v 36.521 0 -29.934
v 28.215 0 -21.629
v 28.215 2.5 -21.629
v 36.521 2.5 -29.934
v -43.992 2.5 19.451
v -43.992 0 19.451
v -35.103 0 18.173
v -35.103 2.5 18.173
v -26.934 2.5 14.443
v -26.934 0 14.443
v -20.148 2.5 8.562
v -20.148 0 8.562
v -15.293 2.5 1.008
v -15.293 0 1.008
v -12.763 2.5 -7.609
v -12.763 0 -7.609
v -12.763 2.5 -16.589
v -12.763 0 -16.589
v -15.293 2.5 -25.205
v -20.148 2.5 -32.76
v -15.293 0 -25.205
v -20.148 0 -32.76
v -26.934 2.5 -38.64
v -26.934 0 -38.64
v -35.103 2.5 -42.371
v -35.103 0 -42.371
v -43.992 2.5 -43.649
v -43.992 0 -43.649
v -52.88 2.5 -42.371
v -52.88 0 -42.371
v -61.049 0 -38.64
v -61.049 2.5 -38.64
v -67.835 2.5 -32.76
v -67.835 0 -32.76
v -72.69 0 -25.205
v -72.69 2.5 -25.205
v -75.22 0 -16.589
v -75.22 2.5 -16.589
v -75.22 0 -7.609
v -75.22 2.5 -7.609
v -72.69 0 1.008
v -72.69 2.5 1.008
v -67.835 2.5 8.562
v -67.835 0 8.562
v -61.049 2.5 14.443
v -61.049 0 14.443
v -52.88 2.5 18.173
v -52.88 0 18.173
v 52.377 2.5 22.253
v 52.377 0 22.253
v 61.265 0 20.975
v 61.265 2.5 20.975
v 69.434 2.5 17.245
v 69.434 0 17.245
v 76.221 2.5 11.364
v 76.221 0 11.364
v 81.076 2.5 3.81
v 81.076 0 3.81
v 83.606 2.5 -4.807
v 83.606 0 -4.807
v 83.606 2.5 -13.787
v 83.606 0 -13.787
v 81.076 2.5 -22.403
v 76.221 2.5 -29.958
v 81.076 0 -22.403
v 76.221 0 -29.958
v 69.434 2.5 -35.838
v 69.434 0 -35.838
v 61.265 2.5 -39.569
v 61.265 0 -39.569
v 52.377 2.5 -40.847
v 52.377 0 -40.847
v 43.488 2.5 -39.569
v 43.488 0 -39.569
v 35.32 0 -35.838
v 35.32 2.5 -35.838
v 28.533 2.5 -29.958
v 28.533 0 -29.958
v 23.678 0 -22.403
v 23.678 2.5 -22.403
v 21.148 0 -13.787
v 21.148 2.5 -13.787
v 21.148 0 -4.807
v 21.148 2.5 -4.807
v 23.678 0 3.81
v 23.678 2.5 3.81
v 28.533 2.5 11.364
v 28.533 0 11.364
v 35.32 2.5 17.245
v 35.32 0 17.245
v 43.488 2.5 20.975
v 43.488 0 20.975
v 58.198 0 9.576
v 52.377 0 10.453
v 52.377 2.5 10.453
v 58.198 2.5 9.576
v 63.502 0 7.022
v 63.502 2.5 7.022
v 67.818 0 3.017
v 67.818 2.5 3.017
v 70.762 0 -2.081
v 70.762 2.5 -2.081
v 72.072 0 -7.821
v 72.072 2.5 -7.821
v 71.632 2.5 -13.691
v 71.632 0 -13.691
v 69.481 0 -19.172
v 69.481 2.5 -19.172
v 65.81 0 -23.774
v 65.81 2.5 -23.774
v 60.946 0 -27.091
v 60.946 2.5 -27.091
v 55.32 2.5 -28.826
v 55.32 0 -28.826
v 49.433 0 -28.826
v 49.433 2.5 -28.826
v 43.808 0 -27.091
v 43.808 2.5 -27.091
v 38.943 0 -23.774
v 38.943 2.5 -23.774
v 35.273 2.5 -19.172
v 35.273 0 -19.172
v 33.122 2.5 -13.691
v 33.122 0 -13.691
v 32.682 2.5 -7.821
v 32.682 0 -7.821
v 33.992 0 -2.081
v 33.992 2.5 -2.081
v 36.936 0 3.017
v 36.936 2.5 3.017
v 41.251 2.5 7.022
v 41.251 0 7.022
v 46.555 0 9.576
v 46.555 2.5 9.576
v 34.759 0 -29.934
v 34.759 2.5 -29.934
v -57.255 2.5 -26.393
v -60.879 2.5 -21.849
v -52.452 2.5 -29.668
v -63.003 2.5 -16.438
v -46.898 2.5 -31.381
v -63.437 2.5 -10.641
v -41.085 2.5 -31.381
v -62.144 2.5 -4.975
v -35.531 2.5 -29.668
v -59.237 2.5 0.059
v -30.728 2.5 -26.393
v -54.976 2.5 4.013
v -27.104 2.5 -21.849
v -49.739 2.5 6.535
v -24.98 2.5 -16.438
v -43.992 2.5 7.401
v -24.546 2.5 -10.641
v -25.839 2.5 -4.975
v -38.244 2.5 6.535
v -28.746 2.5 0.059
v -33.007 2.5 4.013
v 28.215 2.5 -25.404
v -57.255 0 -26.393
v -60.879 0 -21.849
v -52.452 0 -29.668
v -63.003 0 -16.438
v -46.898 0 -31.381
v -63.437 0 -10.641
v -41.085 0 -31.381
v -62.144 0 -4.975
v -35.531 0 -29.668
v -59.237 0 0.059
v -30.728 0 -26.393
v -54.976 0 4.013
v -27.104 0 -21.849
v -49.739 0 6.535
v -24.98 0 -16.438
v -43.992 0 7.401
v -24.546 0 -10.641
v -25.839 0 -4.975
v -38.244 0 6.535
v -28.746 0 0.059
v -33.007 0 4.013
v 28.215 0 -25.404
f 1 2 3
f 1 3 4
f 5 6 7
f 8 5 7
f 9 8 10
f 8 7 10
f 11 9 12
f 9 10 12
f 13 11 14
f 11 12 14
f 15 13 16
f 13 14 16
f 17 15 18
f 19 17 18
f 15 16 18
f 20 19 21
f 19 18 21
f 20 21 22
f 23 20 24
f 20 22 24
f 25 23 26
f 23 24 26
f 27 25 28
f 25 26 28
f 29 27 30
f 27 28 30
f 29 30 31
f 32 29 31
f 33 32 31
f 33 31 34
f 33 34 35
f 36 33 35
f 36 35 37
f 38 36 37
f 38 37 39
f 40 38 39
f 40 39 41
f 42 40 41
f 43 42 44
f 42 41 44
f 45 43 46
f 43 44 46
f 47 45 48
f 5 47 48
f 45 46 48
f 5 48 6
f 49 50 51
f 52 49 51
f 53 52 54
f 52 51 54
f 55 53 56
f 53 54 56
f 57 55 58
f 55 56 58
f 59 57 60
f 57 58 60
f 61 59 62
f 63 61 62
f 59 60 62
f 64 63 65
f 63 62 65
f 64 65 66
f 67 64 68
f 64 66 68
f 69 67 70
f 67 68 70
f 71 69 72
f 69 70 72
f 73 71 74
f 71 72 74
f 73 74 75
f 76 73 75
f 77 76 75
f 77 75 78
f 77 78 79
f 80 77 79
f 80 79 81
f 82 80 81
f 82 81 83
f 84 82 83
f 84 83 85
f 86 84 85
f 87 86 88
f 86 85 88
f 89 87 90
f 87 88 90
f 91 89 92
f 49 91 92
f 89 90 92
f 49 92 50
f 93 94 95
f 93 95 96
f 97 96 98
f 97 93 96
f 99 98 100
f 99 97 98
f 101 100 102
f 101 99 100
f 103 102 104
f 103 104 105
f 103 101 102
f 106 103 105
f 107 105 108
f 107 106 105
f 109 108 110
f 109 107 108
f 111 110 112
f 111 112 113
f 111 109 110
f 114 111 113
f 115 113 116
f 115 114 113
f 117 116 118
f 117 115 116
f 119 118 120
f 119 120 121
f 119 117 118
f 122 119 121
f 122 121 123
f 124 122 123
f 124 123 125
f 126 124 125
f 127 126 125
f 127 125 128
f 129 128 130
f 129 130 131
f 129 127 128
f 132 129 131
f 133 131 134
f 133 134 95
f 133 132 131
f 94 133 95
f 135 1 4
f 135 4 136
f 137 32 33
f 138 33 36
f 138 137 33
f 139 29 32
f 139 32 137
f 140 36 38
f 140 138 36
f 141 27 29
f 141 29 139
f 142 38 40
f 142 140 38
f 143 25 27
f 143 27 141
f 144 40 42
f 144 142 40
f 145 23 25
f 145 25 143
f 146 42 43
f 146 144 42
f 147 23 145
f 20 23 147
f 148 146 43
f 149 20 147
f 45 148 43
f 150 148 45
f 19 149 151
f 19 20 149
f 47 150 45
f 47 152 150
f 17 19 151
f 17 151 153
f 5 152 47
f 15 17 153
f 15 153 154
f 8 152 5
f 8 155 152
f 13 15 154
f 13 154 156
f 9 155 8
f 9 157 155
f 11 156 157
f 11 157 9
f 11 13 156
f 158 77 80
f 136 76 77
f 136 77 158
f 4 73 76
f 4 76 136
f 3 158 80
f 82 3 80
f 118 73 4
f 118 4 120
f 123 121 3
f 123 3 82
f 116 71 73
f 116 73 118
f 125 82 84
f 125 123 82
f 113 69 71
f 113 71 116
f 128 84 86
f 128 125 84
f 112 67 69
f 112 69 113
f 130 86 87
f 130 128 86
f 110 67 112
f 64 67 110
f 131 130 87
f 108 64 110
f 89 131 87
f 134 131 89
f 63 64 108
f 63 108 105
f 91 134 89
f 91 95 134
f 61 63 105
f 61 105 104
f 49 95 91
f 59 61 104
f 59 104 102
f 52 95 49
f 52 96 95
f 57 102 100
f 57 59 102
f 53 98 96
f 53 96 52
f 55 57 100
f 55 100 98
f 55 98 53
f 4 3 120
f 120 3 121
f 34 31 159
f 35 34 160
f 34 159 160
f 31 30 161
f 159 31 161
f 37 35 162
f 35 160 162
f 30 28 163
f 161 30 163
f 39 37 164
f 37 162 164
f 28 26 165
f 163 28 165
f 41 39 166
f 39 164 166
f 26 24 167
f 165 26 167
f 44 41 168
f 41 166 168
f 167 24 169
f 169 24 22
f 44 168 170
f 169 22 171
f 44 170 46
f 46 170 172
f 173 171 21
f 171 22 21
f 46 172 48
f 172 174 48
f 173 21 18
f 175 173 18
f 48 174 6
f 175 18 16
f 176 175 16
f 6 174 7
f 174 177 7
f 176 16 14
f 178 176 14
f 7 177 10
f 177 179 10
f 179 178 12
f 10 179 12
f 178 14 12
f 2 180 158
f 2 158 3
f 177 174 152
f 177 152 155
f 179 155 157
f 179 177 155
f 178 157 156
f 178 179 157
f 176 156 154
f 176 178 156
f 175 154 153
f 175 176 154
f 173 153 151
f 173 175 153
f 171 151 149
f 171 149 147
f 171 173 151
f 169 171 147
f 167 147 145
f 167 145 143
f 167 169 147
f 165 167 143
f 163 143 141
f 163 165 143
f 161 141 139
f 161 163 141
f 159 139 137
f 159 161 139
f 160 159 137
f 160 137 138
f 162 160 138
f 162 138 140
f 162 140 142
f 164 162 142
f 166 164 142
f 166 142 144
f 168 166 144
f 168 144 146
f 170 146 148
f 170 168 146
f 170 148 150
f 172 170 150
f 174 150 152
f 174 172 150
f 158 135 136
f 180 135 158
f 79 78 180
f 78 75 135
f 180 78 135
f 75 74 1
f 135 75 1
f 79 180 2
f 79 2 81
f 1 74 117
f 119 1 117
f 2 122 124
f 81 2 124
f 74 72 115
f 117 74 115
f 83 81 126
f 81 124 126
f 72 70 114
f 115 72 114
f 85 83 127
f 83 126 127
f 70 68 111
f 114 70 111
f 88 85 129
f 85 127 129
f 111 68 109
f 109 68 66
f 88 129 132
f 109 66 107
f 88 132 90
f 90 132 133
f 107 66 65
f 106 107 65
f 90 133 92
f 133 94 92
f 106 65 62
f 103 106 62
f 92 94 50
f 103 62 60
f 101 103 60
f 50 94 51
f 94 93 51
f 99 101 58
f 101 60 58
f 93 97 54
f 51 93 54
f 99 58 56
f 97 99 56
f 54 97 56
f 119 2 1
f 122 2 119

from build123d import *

# Parameters (mm, degrees)
SKETCH1_R           = 31.55
SKETCH1_R_2         = 19.5
BOSS_EXTRUDE1_DEPTH = 2.5
SKETCH2_R           = 31.55
SKETCH2_R_2         = 19.75
BOSS_EXTRUDE2_DEPTH = 2.5


with BuildPart() as part:
    # Sketch1 → Boss-Extrude1 (new body)
    with BuildSketch(Plane(origin=(0, 0, 0), x_dir=(1, 0, 0), z_dir=(0, 1, 0))):
        with Locations(Location((-43.991519585, 12.09868885, 0), (0, 0, 270))):
            Circle(SKETCH1_R)
        with Locations(Location((-43.991519585, 12.09868885, 0), (0, 0, 270))):
            Circle(SKETCH1_R_2, mode=Mode.SUBTRACT)
    extrude(amount=BOSS_EXTRUDE1_DEPTH)


with BuildPart() as body_2:
    # Sketch2 → Boss-Extrude2 (new body)
    with BuildSketch(Plane(origin=(0, 0, 0), x_dir=(1, 0, 0), z_dir=(0, 1, 0))):
        with Locations(Location((52.376774814, 9.296666524, 0), (0, 0, 270))):
            Circle(SKETCH2_R)
        with Locations(Location((52.376774814, 9.296666524, 0), (0, 0, 270))):
            Circle(SKETCH2_R_2, mode=Mode.SUBTRACT)
        Polygon((28.215429536, 25.404230043), (28.215429536, 21.629019843), (36.520891975, 29.934482282), (34.759127216, 29.934482282), align=None, mode=Mode.SUBTRACT)
    extrude(amount=BOSS_EXTRUDE2_DEPTH)


solid = Compound([part.part, body_2.part])
